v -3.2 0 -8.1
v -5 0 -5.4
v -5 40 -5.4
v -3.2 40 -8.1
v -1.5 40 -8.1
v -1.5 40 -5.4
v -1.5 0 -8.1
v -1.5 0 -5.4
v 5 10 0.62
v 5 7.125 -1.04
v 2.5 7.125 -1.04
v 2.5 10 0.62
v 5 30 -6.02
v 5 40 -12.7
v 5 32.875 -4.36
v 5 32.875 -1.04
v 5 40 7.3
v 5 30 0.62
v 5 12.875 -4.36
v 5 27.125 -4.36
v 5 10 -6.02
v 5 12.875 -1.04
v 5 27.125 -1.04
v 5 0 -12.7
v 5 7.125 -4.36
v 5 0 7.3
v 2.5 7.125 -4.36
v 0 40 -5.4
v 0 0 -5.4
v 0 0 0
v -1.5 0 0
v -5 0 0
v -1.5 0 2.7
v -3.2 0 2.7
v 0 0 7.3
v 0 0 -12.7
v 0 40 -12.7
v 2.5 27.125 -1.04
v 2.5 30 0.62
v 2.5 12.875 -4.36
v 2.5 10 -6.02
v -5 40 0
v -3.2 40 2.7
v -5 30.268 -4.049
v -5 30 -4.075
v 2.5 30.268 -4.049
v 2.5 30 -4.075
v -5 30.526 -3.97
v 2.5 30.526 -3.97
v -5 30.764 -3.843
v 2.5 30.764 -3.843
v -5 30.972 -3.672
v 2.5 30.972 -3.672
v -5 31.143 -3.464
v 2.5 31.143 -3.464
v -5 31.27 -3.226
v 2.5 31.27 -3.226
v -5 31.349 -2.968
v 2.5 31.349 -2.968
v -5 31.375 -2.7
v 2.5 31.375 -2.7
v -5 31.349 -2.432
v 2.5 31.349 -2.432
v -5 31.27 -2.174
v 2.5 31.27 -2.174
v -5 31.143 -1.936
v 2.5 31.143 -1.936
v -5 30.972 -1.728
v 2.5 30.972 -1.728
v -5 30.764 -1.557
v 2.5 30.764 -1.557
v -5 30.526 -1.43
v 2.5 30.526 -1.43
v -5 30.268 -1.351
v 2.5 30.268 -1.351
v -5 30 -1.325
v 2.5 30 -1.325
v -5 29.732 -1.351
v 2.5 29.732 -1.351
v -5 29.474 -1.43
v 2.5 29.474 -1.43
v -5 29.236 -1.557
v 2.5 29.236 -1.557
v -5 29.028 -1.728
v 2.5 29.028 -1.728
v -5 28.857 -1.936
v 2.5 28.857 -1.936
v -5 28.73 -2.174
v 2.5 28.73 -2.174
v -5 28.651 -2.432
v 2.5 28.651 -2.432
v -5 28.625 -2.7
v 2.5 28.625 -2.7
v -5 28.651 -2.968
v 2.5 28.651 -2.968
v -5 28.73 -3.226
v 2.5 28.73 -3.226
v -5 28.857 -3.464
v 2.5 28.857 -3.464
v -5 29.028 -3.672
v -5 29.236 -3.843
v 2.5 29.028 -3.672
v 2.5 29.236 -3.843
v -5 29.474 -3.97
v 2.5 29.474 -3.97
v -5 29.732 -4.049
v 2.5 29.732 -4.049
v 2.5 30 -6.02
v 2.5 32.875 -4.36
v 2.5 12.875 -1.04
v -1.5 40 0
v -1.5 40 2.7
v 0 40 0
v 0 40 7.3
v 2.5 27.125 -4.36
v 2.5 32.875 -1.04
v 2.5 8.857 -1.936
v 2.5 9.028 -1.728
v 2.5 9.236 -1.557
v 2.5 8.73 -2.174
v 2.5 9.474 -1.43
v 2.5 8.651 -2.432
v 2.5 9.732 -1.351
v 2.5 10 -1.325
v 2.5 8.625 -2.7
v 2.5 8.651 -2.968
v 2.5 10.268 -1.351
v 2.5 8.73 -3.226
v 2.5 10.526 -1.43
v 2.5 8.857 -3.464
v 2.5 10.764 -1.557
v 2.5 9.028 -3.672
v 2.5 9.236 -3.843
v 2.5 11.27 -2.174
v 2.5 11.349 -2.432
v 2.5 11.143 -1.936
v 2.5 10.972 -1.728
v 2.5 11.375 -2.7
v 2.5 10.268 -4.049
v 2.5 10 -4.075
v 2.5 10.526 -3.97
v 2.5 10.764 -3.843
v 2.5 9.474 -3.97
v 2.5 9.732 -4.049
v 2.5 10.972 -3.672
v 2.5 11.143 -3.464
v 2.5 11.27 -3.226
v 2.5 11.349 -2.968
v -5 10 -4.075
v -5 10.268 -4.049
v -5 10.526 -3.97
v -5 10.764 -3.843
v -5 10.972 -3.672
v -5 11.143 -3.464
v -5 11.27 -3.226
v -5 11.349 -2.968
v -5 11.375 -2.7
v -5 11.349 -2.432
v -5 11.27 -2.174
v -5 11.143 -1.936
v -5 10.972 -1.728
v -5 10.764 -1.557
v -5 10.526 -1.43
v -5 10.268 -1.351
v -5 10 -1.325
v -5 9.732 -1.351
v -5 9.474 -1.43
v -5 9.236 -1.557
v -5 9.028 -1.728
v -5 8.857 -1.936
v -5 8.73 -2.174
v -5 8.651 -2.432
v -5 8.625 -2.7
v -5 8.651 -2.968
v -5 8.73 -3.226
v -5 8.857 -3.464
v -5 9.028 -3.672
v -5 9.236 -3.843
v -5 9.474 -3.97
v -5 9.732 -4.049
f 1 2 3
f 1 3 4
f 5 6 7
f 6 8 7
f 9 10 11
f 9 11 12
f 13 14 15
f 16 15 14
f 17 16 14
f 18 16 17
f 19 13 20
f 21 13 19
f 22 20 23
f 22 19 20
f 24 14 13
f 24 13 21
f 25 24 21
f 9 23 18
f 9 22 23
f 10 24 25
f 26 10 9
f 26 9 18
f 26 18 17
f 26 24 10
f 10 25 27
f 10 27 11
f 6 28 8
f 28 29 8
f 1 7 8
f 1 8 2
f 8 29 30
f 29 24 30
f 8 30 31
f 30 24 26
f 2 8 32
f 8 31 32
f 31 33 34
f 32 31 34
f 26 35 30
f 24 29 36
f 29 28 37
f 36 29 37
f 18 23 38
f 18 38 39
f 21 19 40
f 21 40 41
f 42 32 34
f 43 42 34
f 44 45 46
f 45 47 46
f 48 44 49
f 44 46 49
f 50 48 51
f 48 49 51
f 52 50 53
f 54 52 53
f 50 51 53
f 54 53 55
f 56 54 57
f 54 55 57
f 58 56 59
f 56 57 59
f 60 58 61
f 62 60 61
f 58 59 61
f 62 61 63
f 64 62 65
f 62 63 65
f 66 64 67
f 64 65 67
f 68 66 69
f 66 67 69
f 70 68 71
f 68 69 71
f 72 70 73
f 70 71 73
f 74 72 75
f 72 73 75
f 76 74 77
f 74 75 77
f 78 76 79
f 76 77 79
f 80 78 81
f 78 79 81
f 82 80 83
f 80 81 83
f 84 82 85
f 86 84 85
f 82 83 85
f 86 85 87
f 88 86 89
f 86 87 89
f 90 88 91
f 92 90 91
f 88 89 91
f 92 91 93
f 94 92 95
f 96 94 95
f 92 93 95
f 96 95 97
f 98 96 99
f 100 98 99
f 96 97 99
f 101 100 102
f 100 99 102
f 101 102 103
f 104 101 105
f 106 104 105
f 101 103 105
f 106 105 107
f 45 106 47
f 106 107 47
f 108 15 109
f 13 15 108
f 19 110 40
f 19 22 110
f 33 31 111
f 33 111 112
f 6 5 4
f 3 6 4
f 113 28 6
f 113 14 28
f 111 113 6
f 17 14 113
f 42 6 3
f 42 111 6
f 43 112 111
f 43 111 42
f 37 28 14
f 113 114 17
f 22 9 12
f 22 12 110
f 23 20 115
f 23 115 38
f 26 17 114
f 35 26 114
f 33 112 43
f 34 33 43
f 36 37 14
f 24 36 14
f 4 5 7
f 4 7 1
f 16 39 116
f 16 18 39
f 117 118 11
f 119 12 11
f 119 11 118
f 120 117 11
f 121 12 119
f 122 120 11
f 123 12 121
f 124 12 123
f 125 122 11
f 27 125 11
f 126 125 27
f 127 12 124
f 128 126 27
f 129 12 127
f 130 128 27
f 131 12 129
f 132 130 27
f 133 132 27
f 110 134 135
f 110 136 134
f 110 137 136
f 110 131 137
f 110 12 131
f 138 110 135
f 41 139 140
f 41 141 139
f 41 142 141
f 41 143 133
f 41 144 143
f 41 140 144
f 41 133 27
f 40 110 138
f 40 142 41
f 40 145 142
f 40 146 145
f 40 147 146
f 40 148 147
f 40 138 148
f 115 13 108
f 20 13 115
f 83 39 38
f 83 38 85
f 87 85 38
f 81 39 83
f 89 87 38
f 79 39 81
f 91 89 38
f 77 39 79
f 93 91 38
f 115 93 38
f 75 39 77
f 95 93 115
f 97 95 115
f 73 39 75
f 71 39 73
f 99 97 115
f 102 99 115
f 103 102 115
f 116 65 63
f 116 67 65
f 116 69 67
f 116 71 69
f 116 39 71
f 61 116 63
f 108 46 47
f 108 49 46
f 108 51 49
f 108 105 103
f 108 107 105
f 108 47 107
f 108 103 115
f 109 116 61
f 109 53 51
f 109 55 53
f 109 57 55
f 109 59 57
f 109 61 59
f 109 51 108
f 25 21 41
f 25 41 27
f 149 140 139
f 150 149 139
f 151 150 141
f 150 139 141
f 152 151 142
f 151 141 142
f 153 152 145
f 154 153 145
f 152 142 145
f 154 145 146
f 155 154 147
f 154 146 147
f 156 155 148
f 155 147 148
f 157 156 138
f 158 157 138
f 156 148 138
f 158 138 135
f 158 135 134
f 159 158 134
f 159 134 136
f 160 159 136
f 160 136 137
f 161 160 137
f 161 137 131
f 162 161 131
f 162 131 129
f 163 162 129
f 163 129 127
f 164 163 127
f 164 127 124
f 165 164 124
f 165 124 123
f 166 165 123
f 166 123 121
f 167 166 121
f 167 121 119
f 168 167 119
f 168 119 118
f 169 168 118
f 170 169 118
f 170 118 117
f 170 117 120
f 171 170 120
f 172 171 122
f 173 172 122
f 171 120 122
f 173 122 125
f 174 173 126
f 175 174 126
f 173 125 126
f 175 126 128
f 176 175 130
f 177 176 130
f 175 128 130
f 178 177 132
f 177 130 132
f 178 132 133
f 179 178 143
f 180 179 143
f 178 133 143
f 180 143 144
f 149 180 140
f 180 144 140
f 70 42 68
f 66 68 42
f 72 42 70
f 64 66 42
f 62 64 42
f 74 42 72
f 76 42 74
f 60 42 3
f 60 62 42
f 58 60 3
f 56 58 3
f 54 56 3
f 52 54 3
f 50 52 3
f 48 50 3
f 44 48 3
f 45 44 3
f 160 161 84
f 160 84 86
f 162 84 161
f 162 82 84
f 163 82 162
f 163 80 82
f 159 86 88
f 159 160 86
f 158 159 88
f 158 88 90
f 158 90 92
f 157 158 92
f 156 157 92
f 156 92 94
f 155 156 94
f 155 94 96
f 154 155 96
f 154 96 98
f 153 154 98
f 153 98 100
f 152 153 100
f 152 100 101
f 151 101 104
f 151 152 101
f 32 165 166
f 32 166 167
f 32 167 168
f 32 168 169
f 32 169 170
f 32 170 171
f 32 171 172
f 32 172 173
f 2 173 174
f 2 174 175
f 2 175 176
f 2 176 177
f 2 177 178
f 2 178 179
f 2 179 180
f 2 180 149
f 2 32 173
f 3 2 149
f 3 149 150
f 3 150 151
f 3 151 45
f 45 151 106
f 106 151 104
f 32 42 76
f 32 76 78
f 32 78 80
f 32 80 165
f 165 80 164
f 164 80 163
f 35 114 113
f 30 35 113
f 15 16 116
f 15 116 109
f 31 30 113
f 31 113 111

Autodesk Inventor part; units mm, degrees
ref_plane "YZ Plane" through (0, 0, 0) normal (1, 0, 0) x (0, 1, 0)
ref_plane "XZ Plane" through (0, 0, 0) normal (0, 1, 0) x (-1, 0, 0)
ref_plane "XY Plane" through (0, 0, 0) normal (0, 0, 1) x (1, 0, 0)
sketch "Sketch1" plane through (0, 0, 0) normal (0, 1, 0) x (-1, 0, 0)
  line L0 (0, -5.4) -> (1.5, -5.4)
  line L1 (1.5, -5.4) -> (1.5, -8.1)
  line L2 (1.5, -8.1) -> (3.2, -8.1)
  line L3 (0, 0) -> (1.5, 0)
  line L4 (1.5, 0) -> (1.5, 2.7)
  line L5 (1.5, 2.7) -> (3.2, 2.7)
  line L6 (5, 0) -> (5, -5.4)
  line L7 (5, -5.4) -> (3.2, -8.1)
  line L8 (5, 0) -> (3.2, 2.7)
  line L9 (0, -5.4) -> (0, -12.7)
  line L10 (0, -12.7) -> (-5, -12.7)
  line L11 (-5, -12.7) -> (-5, 7.3)
  line L12 (-5, 7.3) -> (0, 7.3)
  line L13 (0, 7.3) -> (0, 0)
  dimension "d0" = 5.4
  dimension "d1" = 1.5
  dimension "d2" = 2.7
  dimension "d3" = 1.7
  dimension "d4" = 2.7
  dimension "d5" = 1.7
  dimension "d9" = 5
  dimension "d10" = 20
  dimension "d11" = 7.3
extrude "Extrusion1" add sketch "Sketch1" along normal blind 40
sketch "Sketch2" plane through (5, 0, 7.3) normal (1, 0, 0) x (0, 0, -1)
  line L0 (11.6599, 7.125) -> (8.3401, 7.125)
  line L1 (8.3401, 7.125) -> (6.6802, 10)
  line L2 (6.6802, 10) -> (8.3401, 12.875)
  line L3 (8.3401, 12.875) -> (11.6599, 12.875)
  line L4 (11.6599, 12.875) -> (13.3198, 10)
  line L5 (13.3198, 10) -> (11.6599, 7.125)
  line L6 (20, 0) -> (0, 0) projected
  line L7 (0, 0) -> (0, 40) projected
  line L8 (11.6599, 27.125) -> (8.3401, 27.125)
  line L9 (8.3401, 27.125) -> (6.6802, 30)
  line L10 (6.6802, 30) -> (8.3401, 32.875)
  line L11 (8.3401, 32.875) -> (11.6599, 32.875)
  line L12 (11.6599, 32.875) -> (13.3198, 30)
  line L13 (13.3198, 30) -> (11.6599, 27.125)
  line L14 (0, 40) -> (20, 40) projected
  point P0 (7.3, 0)
  point P1 (10, 10)
  point P2 (10, 30)
  dimension "d12" = 5.75
  dimension "d13" = 10
  dimension "d14" = 10
  dimension "d15" = 5.75
  dimension "d16" = 10
  dimension "d17" = 10
extrude "Extrusion2" cut sketch "Sketch2" against normal blind 2.5
sketch "Sketch3" plane through (2.5, 0, 7.3) normal (1, 0, 0) x (0, 0, -1)
  point P0 (7.3, 0)
sketch "Sketch4" plane through (2.5, 0, 7.3) normal (1, 0, 0) x (0, 0, -1)
  circle A0 centre (10, 10) radius 1.375
  circle A1 centre (10, 30) radius 1.375
  point P0 (7.3, 0)
  dimension "d20" = 2.75
  dimension "d21" = 2.75
extrude "Extrusion3" cut sketch "Sketch4" against normal blind 20
properties part number "slotMountingPlate"
